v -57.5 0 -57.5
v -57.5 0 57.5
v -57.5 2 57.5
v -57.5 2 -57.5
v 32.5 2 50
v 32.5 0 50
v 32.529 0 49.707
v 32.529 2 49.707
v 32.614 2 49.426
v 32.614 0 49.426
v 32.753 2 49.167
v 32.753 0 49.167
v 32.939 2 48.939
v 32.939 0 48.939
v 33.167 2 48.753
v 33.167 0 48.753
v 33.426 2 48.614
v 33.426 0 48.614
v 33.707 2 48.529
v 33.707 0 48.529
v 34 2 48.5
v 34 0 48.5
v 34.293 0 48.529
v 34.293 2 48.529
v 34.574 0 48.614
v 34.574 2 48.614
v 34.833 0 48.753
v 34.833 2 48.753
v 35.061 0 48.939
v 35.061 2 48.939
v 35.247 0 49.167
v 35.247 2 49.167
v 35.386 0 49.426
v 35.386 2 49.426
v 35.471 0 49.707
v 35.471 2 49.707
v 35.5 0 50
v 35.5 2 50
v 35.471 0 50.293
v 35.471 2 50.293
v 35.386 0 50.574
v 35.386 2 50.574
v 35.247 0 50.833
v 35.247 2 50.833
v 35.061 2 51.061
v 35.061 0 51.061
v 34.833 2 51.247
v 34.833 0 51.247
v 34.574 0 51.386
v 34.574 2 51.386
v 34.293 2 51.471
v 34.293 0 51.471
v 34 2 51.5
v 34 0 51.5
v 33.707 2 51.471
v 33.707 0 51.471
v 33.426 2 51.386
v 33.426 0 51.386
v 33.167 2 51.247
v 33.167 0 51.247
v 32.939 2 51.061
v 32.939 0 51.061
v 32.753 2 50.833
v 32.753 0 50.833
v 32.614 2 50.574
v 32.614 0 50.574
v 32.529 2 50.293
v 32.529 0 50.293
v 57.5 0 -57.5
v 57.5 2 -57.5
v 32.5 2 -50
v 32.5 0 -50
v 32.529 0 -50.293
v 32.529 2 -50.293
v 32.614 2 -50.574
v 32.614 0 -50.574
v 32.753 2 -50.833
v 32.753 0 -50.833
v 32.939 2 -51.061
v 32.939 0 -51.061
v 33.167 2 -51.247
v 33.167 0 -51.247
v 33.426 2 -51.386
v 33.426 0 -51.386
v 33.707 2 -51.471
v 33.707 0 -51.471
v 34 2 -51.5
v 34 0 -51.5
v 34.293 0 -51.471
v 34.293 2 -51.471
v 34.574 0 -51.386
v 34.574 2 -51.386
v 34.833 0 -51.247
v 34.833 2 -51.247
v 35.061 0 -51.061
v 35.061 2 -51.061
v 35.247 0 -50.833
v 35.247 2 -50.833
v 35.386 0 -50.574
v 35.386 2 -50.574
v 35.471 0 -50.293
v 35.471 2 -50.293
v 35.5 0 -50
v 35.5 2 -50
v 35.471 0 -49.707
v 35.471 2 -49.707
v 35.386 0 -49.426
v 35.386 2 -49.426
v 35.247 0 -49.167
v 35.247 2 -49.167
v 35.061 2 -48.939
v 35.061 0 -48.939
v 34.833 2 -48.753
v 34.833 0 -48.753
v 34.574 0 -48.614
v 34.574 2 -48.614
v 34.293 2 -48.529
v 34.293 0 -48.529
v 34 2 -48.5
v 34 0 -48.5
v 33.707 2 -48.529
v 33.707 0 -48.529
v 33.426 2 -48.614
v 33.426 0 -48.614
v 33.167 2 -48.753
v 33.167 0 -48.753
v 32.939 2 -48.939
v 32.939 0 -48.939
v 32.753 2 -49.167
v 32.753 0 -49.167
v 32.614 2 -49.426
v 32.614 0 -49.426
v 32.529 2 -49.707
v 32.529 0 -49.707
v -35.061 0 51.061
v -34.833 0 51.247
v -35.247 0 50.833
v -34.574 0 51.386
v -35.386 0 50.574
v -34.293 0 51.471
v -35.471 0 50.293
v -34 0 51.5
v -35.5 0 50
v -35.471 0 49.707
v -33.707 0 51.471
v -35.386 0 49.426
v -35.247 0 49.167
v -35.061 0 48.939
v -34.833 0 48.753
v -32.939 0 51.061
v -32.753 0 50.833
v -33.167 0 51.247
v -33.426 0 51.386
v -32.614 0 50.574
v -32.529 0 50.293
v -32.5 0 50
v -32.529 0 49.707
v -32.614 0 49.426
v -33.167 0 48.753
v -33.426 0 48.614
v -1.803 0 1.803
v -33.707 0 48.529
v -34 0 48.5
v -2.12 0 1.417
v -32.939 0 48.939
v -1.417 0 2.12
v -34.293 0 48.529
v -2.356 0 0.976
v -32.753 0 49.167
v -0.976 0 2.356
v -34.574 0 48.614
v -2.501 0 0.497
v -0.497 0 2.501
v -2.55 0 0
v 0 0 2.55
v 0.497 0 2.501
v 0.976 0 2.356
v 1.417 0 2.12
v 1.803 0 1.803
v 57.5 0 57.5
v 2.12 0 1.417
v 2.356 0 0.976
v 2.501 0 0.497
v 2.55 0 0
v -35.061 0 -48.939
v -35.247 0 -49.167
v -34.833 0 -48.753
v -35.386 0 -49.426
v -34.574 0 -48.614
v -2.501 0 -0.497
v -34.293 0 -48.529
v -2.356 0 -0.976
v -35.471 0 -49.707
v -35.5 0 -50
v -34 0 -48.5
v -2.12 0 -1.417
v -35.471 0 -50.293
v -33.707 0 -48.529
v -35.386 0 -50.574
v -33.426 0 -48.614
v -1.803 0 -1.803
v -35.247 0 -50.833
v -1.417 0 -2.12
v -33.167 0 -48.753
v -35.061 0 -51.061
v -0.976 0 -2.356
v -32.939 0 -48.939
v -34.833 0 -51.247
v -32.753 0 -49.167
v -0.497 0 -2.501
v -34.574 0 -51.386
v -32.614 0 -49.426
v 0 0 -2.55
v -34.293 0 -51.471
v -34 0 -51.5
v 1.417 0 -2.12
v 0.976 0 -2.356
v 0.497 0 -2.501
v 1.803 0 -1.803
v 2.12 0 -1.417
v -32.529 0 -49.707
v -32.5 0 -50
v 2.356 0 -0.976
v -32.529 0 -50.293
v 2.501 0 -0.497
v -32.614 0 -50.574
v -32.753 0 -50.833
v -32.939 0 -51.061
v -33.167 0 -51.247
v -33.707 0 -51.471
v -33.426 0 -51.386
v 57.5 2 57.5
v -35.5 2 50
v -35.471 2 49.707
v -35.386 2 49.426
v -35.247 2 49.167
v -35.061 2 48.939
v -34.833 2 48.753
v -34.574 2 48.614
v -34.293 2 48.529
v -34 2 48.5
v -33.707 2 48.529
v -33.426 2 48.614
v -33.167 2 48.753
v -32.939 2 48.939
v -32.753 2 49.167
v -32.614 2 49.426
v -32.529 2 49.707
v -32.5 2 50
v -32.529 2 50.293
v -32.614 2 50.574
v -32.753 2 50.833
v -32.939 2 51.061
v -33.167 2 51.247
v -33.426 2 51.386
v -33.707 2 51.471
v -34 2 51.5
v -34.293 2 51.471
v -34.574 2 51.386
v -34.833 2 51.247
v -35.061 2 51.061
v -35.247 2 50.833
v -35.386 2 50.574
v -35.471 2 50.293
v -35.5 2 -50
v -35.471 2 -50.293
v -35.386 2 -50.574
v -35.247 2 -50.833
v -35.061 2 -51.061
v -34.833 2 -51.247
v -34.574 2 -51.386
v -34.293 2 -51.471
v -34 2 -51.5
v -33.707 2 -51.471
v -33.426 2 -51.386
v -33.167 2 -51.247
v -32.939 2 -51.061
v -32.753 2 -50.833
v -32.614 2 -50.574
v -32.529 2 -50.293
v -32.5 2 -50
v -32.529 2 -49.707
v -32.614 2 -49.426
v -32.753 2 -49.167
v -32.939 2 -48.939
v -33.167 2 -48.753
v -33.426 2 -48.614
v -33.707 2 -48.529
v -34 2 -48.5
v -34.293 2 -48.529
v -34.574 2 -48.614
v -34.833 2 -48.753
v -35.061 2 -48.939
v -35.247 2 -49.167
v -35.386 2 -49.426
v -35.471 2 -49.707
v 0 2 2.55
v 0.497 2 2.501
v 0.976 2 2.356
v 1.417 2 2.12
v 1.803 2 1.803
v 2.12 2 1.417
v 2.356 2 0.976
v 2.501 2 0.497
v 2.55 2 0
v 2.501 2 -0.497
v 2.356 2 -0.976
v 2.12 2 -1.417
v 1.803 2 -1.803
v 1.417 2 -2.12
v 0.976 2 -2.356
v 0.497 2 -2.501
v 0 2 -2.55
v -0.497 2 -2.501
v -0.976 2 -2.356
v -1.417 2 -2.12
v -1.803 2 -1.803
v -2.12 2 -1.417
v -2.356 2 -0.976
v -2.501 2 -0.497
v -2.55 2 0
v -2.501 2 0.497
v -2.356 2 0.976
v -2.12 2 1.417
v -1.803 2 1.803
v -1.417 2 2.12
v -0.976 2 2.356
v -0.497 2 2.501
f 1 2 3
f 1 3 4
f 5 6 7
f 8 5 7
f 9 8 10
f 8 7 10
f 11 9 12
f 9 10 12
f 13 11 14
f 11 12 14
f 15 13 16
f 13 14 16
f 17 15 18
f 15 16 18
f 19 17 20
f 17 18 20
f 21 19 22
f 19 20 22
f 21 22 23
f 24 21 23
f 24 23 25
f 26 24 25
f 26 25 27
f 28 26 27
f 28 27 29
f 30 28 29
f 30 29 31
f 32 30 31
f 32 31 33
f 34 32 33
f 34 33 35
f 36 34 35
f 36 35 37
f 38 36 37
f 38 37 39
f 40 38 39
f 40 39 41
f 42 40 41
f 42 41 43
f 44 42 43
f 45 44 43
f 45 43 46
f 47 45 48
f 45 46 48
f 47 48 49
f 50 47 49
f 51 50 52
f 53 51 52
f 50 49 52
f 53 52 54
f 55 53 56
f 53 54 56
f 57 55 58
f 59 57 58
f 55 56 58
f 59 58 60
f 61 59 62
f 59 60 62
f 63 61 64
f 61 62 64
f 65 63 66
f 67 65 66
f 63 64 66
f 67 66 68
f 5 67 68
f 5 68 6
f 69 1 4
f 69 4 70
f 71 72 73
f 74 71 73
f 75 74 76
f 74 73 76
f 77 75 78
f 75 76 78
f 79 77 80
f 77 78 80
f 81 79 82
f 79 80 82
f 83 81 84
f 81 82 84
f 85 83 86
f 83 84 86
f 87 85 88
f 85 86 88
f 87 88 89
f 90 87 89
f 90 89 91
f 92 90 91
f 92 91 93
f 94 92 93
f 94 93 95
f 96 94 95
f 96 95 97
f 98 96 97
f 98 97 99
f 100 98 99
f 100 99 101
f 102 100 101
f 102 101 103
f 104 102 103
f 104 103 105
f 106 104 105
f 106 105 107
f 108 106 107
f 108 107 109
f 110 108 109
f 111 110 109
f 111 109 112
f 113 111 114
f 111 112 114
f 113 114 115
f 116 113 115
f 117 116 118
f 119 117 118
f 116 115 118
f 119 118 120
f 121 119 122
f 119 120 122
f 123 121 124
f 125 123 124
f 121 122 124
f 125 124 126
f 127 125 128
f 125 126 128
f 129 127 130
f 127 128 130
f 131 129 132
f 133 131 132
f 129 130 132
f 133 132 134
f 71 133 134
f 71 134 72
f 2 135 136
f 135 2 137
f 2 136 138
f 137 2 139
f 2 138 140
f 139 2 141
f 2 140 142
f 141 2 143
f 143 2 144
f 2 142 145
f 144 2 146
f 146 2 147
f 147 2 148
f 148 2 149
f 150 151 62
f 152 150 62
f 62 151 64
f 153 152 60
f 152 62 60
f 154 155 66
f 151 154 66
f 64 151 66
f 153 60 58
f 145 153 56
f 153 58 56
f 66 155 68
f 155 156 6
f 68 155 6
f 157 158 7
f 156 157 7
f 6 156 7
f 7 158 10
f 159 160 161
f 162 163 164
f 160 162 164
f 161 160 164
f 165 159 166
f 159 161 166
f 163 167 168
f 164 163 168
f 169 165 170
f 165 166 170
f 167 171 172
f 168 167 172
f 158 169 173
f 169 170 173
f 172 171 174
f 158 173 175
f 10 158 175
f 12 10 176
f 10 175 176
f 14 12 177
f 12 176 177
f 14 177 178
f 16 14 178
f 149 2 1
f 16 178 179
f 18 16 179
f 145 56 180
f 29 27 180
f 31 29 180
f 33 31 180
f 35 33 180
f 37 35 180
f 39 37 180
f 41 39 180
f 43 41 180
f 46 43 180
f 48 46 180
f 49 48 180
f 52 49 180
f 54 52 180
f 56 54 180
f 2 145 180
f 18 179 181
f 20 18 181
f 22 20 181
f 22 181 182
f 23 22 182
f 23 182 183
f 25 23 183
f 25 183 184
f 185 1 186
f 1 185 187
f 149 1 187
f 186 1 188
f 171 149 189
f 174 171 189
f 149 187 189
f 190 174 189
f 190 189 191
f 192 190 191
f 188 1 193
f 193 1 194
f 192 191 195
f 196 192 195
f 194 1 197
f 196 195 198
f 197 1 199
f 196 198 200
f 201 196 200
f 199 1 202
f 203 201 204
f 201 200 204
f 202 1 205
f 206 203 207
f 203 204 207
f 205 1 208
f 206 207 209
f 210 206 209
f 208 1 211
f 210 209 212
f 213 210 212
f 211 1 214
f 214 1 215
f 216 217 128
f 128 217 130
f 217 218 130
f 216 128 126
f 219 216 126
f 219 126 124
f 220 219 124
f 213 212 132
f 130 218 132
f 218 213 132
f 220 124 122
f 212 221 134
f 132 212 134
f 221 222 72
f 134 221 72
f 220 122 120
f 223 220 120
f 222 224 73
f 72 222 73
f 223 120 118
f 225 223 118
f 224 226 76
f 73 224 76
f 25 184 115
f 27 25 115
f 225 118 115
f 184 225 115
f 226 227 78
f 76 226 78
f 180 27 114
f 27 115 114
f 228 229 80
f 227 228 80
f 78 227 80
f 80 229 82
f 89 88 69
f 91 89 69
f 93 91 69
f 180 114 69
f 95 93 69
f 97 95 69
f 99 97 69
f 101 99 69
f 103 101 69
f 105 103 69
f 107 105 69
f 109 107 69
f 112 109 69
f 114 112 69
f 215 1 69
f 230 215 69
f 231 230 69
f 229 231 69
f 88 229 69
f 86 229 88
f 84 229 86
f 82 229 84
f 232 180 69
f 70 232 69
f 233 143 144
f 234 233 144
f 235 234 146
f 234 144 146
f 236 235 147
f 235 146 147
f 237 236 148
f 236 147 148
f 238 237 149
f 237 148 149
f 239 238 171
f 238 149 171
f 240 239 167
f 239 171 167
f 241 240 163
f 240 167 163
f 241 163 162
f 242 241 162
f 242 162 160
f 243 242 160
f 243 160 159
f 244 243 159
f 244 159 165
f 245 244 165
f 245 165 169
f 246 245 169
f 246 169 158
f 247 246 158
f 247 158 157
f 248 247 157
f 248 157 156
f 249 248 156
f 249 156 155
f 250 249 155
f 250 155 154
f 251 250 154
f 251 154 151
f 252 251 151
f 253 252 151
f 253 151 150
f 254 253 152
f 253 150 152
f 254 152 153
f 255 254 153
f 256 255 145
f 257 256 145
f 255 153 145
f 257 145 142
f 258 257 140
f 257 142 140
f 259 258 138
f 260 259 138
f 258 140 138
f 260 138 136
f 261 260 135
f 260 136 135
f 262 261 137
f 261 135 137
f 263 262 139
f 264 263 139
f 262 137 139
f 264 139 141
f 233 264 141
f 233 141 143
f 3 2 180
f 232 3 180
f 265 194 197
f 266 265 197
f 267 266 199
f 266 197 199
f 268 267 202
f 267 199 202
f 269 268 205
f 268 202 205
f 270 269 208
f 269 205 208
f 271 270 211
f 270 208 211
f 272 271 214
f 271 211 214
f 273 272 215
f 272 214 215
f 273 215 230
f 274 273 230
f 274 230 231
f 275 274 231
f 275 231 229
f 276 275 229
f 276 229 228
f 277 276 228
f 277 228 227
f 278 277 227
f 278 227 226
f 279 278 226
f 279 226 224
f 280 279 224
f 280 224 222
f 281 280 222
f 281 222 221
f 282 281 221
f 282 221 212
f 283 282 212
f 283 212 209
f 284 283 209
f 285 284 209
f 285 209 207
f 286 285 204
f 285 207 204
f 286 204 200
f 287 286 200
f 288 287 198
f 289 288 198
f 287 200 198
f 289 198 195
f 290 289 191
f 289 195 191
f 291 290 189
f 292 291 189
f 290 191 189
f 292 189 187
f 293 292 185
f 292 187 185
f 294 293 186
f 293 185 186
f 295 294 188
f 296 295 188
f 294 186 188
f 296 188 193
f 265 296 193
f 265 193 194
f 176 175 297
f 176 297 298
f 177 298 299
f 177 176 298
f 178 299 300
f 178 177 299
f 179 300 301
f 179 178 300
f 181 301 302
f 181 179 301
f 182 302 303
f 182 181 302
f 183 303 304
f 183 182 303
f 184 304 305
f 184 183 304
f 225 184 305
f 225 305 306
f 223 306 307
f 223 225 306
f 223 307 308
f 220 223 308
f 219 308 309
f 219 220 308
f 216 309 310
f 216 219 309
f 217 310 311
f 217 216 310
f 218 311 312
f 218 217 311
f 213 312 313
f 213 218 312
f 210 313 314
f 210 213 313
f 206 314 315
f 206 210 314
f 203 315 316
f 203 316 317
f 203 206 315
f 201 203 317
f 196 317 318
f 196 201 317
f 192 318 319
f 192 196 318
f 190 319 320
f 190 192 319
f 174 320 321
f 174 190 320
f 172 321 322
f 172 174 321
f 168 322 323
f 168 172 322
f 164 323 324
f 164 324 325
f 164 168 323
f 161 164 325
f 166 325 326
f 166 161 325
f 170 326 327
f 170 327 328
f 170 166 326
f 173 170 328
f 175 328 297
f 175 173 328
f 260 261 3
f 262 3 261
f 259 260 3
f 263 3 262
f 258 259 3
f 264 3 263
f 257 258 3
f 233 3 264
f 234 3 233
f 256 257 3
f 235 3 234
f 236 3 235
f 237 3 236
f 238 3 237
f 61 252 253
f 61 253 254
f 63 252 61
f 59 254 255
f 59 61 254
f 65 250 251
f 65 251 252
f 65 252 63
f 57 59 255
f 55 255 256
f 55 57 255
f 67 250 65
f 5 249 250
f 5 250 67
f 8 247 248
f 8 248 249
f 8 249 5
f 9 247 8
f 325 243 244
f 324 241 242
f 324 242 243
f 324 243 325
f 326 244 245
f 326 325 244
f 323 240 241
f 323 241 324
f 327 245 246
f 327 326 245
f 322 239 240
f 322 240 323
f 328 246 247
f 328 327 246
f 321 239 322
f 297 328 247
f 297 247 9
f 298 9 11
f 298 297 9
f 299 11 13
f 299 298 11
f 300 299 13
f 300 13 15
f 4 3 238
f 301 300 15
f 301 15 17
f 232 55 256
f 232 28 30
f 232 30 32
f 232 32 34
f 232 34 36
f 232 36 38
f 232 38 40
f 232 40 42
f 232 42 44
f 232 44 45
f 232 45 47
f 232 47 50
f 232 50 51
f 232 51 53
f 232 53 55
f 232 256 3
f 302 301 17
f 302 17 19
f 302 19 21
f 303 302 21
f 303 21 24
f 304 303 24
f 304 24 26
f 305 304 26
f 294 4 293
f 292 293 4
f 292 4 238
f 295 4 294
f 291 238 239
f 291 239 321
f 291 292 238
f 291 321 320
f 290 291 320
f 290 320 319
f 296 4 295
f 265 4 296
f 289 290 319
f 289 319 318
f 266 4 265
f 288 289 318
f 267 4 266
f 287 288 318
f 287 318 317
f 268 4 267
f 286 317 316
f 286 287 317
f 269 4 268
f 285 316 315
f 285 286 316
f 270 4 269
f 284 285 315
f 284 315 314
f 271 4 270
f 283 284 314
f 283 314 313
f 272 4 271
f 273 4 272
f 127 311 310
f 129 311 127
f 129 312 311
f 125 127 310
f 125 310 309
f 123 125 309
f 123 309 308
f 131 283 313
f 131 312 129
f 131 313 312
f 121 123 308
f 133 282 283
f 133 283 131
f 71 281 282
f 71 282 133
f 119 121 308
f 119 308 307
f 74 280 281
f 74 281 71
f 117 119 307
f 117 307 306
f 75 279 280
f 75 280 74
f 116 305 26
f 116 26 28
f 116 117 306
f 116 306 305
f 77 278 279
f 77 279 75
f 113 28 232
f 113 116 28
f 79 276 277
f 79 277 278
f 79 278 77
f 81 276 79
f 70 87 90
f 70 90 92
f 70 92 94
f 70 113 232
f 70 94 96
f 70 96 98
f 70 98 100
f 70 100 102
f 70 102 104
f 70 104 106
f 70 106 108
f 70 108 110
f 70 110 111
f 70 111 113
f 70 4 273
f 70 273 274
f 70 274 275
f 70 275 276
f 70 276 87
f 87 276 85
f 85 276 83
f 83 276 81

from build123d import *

# Parameters (mm, degrees)
SKETCH1_W             = 115
SKETCH1_H             = 115
SKETCH1_R             = 2.55
BOSS_EXTRUDE1_DEPTH   = 2
F_3_0MM_DOWEL_HOLE1_D = 3


with BuildPart() as part:
    # Sketch1 → Boss-Extrude1 (new body)
    with BuildSketch(Plane(origin=(0, 0, 0), x_dir=(1, 0, 0), z_dir=(0, 1, 0))):
        Rectangle(SKETCH1_W, SKETCH1_H)
        with Locations(Location((0, 0, 0), (0, 0, 270))):
            Circle(SKETCH1_R, mode=Mode.SUBTRACT)
    extrude(amount=BOSS_EXTRUDE1_DEPTH)

    # Ø3.0mm Dowel Hole1 (through all)
    with Locations(Plane(origin=(0, 2, 0), x_dir=(1, 0, 0), z_dir=(0, 1, 0))):
        with Locations((-34, 50), (34, 50), (34, -50), (-34, -50)):
            Hole(F_3_0MM_DOWEL_HOLE1_D / 2)


solid = part.part
